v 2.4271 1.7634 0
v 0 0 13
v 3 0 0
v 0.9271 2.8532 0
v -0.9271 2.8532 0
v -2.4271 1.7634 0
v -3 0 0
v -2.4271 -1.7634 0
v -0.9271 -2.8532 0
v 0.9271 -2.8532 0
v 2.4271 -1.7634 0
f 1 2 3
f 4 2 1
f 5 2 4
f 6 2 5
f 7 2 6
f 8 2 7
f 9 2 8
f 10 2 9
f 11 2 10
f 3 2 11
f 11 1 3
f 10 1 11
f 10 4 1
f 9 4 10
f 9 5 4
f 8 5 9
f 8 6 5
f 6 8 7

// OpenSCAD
// Generated by SolidPython 1.0.1 on 2020-07-29 00:46:43


cylinder(h = 13, r1 = 3, r2 = 0);
/***********************************************
*********      SolidPython code:      **********
************************************************
 
# import packages: SolidPython
from solid import *
from solid.utils import *
from itertools import chain, combinations, permutations


class Resize:

    def __init__(self, scad_file):
        self.scad_file = scad_file
        #self.scad_file = import_scad(scad_file)
        # cone/cylinder param:
        self.r1 = 0
        self.r2 = 0
        self.h = 0
        # rectangular prism param:
        self.w = 0
        self.l = 0
        # ellipse param:
        self.r = 0

    # import OpenScad code (file name corresponds to shape)


    # classify shape + parameters
    def assign(self, param1, param2, param3):
        if self.scad_file == 'cone.scad':
            self.r1 = param1
            self.r2 = param2
            self.h = param3
        elif self.scad_file == 'cylinder.scad':
            self.r1 = param1
            self.r2 = param2
            self.h = param3
        elif self.scad_file == 'rectangularPrism.scad':
            self.h = param1
            self.l = param2
            self.w = param3
        else:
            self.r = param1
            self.h = param2

    # resize parameters
    def iterate(self):
        x = range(3, 20, 2)
        i = 1
        if self.scad_file == 'cone.scad':
            tempList = list(permutations(x, 2))
            for temp in tempList:
                param1 = temp[0]
                param2 = temp[1]
                filepath = 'produced_scad_files/' + 'cone' + str(param1) + '_' + str(param2) + '_' + '.scad'
                scad_render_to_file(cylinder(h=param1, r1=param2, r2=0), filepath)

        elif self.scad_file == 'cylinder.scad':
            tempList = list(permutations(x, 3))
            for temp in tempList:
                param1 = temp[0]
                param2 = temp[1]
                filepath = 'produced_scad_files/' + 'cylinder' + str(param1) + '_' + str(param2) + '_' + '.scad'
                scad_render_to_file(cylinder(h=param1, r1=param2, r2=param2), filepath)

        elif self.scad_file == 'rectangularPrism.scad':
            tempList = list(permutations(x, 3))
            for temp in tempList:
                param1 = temp[0]
                param2 = temp[1]
                param3 = temp[2]
                filepath = 'produced_scad_files/' + 'rectangularPrism' + str(param1) + '_' + str(param2) + '_' + str(
                    param3) + '.scad'
                scad_render_to_file(cube(size=(param1, param2, param3)), filepath)

        elif self.scad_file == 'ellipse.scad':
            tempList = list(permutations(x, 4))
            for temp in tempList:
                param1 = temp[0]
                param2 = temp[1]
                param3 = temp[2]
                param4 = temp[3]
                filepath = 'produced_scad_files/' + 'ellipse' + str(param1) + '_' + str(param2) + '_' + str(param3) + '_' + str(param4) + '.scad'
                scad_render_to_file(scale([param1, param2, param3])(sphere(r=param4)), filepath)

    def render_to_scadfile(self):
        scad_render_to_file(scad, 'example.scad') 
 
************************************************/
